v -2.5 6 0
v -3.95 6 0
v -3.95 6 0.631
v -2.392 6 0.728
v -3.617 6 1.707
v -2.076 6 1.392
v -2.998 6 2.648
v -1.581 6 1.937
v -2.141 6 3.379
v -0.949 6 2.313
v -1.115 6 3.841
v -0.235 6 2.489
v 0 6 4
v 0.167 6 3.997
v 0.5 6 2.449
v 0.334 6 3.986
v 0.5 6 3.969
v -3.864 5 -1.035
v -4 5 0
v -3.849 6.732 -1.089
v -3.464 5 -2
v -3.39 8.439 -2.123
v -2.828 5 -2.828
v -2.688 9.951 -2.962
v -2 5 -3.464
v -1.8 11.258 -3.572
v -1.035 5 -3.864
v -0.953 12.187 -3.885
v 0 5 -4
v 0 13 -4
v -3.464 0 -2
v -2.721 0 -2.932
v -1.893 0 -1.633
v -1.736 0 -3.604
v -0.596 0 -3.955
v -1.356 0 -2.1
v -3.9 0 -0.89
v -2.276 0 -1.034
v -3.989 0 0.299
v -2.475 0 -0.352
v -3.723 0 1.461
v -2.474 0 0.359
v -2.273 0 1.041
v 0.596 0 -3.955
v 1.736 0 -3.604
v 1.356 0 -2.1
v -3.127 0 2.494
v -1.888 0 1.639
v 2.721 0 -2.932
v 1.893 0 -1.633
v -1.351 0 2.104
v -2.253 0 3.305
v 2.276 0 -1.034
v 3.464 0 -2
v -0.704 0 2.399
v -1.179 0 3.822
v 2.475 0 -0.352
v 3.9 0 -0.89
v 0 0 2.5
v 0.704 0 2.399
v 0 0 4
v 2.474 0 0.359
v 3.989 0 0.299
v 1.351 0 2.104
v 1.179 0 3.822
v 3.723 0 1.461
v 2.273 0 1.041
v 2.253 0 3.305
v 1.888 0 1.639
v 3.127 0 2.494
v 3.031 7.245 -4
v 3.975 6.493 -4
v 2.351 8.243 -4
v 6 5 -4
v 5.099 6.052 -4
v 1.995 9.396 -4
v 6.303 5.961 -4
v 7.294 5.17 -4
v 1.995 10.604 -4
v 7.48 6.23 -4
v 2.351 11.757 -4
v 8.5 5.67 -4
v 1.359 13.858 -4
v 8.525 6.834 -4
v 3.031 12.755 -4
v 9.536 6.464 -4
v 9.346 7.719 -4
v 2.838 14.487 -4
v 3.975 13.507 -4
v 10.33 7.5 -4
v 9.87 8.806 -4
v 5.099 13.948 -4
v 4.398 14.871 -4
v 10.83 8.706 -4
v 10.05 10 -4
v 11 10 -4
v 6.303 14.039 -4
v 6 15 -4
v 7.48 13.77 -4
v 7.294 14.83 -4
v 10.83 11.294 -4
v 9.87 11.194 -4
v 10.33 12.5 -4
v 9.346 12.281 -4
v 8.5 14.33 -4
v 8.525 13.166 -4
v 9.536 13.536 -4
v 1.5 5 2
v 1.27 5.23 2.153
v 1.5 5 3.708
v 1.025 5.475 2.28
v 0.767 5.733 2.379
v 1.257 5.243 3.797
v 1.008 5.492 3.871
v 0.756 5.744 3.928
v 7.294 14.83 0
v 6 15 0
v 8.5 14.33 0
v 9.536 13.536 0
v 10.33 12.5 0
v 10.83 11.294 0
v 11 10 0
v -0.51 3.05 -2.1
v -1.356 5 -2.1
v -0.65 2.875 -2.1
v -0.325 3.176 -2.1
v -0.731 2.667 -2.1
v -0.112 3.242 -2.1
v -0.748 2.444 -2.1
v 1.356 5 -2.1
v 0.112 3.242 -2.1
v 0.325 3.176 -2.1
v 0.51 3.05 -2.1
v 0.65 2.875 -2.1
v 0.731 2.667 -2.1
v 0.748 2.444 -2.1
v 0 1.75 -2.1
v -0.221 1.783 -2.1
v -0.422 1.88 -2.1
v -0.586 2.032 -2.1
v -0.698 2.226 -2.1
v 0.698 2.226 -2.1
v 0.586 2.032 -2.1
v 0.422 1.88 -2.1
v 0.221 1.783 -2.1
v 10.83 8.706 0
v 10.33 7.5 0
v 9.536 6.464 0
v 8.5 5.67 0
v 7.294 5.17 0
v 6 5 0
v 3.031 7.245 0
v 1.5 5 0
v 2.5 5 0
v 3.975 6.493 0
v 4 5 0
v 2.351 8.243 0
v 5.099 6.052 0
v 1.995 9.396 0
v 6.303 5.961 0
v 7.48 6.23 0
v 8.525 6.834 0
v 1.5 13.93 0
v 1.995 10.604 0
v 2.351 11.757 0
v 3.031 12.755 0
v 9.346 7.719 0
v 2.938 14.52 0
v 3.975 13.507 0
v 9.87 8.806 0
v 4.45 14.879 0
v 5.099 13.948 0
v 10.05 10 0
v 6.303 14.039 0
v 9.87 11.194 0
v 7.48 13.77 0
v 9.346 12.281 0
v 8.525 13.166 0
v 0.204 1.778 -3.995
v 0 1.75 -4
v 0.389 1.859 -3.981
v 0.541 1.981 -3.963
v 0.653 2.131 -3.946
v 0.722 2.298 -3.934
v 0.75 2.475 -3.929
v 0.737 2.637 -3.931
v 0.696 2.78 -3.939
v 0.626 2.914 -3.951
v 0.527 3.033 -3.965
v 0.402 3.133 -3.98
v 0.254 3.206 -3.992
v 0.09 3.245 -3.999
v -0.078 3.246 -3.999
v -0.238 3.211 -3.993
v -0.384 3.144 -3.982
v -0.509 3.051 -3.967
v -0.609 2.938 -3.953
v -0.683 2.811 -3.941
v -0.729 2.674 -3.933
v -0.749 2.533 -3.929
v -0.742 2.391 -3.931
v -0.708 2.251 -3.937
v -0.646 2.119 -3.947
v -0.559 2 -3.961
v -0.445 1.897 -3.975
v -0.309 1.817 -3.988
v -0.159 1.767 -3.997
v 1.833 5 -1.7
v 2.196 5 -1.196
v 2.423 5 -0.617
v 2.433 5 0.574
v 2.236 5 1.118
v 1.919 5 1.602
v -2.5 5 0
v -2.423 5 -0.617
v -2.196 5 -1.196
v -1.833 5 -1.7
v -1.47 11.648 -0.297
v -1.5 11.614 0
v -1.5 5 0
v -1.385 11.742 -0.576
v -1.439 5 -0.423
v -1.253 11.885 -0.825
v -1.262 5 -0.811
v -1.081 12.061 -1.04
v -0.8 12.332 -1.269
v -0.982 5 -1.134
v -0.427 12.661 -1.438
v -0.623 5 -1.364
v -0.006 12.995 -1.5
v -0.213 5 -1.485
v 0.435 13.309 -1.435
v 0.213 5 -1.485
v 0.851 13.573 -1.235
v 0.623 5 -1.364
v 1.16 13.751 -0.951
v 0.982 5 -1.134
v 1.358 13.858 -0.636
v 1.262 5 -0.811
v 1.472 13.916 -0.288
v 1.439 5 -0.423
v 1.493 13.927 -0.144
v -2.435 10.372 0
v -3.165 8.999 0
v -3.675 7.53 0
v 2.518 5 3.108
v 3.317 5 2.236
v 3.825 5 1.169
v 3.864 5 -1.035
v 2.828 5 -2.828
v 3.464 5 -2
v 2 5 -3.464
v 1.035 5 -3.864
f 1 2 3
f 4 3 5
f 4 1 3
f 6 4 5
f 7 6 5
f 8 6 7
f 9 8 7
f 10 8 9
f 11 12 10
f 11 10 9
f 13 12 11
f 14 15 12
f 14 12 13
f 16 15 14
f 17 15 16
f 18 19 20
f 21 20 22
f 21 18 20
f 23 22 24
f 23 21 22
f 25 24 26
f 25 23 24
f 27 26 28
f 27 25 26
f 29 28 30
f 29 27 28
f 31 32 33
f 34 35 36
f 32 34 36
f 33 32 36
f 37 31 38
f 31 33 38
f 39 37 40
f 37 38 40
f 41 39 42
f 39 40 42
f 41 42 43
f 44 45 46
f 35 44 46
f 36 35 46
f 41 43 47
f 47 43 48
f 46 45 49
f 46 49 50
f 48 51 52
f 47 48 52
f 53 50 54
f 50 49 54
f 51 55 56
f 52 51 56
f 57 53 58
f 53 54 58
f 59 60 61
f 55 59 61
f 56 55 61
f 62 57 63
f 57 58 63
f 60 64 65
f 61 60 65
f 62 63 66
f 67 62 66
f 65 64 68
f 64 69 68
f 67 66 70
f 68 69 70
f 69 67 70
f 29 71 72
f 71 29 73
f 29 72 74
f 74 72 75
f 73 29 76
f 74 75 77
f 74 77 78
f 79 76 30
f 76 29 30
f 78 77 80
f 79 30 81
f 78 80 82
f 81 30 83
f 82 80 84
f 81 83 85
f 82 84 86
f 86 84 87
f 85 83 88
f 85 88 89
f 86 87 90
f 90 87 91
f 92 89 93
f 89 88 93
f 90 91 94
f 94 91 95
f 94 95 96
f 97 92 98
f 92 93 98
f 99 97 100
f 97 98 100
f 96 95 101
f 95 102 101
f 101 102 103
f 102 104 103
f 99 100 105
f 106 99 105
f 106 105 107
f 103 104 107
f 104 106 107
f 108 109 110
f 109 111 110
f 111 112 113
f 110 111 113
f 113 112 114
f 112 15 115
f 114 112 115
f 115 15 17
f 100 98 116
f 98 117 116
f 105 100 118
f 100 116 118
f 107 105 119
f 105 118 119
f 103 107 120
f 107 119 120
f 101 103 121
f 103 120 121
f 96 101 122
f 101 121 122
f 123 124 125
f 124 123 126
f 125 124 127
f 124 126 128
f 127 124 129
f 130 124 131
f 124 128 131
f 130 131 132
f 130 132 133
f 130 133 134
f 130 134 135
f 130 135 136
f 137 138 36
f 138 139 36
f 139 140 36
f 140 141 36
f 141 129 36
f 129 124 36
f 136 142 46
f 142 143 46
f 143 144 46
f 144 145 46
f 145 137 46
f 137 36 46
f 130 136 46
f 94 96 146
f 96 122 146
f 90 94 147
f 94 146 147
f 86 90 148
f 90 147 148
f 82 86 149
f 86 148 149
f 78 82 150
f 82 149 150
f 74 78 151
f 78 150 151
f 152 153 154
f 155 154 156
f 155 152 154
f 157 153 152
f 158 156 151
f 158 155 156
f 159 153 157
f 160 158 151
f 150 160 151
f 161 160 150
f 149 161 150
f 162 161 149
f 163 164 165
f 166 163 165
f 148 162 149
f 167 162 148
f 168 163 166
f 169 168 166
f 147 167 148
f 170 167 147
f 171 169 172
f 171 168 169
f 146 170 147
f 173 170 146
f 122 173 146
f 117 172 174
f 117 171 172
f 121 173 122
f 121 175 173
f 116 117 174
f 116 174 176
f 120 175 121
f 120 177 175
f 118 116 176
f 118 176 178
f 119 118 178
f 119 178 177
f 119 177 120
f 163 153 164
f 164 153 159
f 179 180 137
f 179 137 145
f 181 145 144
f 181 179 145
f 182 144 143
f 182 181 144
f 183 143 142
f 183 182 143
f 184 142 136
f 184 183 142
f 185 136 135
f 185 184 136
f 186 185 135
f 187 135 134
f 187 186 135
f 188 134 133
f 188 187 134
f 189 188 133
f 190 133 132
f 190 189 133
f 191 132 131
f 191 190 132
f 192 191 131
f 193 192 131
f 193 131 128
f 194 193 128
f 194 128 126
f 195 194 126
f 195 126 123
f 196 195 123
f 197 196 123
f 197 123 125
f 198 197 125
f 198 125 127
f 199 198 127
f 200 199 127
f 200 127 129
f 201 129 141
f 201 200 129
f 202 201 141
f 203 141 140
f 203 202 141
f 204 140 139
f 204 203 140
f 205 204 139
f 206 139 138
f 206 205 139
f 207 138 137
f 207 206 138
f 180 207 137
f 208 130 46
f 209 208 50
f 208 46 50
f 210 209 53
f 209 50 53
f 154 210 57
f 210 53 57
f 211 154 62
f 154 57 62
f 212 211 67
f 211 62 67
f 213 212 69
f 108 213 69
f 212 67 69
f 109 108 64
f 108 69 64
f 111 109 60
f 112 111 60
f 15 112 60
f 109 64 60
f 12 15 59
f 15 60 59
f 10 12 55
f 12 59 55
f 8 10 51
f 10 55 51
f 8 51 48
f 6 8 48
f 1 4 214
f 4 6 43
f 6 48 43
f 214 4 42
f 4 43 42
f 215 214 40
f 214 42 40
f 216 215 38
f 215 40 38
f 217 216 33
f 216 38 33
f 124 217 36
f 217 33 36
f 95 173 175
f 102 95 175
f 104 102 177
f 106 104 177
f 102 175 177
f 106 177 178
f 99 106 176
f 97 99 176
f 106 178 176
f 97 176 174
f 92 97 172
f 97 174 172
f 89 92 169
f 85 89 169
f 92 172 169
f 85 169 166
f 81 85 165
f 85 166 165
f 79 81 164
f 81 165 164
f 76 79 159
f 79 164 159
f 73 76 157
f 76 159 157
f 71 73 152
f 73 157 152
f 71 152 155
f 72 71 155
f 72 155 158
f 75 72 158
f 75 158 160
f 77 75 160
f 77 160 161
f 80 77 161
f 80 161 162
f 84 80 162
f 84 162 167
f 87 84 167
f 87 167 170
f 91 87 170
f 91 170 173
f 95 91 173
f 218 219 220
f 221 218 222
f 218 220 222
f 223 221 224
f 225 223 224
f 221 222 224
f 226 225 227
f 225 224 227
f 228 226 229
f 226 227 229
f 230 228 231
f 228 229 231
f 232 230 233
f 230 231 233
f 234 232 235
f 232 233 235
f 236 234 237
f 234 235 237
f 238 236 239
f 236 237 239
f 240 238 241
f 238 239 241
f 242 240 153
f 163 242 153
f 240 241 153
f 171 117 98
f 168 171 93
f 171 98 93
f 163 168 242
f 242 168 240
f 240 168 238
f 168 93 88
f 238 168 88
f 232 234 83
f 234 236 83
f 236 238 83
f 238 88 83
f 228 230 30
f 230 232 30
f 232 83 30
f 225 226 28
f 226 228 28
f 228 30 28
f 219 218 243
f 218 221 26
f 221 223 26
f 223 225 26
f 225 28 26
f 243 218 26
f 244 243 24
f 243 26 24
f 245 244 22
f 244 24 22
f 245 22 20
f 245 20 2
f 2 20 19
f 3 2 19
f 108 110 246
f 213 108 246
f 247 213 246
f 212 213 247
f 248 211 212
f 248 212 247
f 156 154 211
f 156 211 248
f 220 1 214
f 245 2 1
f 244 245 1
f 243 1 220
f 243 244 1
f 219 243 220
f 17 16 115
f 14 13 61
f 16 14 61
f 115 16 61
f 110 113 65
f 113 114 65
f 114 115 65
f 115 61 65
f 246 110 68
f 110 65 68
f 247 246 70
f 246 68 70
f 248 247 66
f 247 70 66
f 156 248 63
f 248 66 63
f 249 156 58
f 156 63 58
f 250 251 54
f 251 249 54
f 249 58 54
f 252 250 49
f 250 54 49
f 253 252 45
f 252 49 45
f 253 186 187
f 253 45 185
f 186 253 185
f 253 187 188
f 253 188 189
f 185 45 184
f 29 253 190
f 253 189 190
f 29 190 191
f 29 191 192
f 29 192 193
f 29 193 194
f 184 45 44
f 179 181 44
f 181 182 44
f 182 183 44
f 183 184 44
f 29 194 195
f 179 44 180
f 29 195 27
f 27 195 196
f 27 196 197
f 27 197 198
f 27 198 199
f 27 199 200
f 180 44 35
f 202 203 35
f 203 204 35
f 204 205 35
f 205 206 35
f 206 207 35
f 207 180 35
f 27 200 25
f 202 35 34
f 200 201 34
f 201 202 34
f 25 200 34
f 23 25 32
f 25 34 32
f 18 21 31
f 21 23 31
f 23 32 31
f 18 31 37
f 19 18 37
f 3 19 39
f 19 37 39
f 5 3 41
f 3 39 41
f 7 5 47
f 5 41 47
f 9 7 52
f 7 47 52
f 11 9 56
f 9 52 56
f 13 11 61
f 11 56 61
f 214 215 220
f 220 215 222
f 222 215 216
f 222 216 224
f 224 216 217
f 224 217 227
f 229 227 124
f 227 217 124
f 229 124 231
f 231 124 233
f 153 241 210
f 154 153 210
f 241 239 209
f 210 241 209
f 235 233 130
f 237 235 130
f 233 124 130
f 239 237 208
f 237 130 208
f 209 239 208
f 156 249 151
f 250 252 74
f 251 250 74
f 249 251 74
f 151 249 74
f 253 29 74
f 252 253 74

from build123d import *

# Parameters (mm, degrees)
SKETCH_1_R          = 4
EXTRUDE_1_DEPTH     = 6
CUT_EXTRUDE_1_DEPTH = 9.246211251
SKETCH_4_W          = 15
SKETCH_4_H          = 10
EXTRUDE_2_DEPTH     = 4
SKETCH_5_R          = 4.05
CUT_EXTRUDE_3_DEPTH = 20.02629759
FILLET_1_R          = 10
FILLET_2_R          = 5
CUT_EXTRUDE_4_DEPTH = 16.394804409
SKETCH_7_R          = 1.5
CUT_EXTRUDE_5_DEPTH = 20.02629769
SKETCH_8_R          = 0.75
CUT_EXTRUDE_7_DEPTH = 3
SKETCH_9_W          = 2.5
SKETCH_9_H          = 1
CUT_EXTRUDE_8_DEPTH = 20.02629769
CHAMFER_1_SIZE      = 1


# Some blends are built 0.0001 mm under size
with BuildPart() as part:
    # 草图1 → 凸台-拉伸1 (new body)
    with BuildSketch(Plane(origin=(0, 0, 0), x_dir=(1, 0, 0), z_dir=(0, 1, 0))):
        with Locations(Location((0, 0, 0), (0, 0, 270))):
            Circle(SKETCH_1_R)
    extrude(amount=EXTRUDE_1_DEPTH)

    # 草图2 → 切除-拉伸1 (cut, through all)
    with BuildSketch(Plane(origin=(0, 0, 0), x_dir=(1, 0, 0), z_dir=(0, 1, 0))):
        with BuildLine():
            Line((-1.356465997, 2.1), (1.356465997, 2.1))
            ThreePointArc((1.356465997, 2.1), (0, -2.5), (-1.356465997, 2.1))
        make_face()
    extrude(amount=CUT_EXTRUDE_1_DEPTH, mode=Mode.SUBTRACT)

    # 草图4 → 凸台-拉伸2 (add)
    with BuildSketch(Plane.XY.offset(-4)):
        with Locations((3.5, 10)):
            Rectangle(SKETCH_4_W, SKETCH_4_H)
    extrude(amount=EXTRUDE_2_DEPTH)

    # 草图5 → 切除-拉伸3 (cut, through all)
    with BuildSketch(Plane.XY):
        with Locations((6, 10)):
            Circle(SKETCH_5_R)
    extrude(amount=-CUT_EXTRUDE_3_DEPTH, mode=Mode.SUBTRACT)

    # 圆角1
    # the kernel refuses this fillet: 10 mm, written as the material it takes off along each edge
    with BuildSketch(Plane(origin=(-4, 15, -29), x_dir=(0, -1, 0), z_dir=(0, 0, 1))) as fillet_1_piece_1:
        with BuildLine():
            CenterArc((FILLET_1_R, FILLET_1_R), FILLET_1_R, 180, 90)
            Line((0, FILLET_1_R), (0, 0))
            Line((0, 0), (FILLET_1_R, 0))
        make_face()
    extrude(amount=54, mode=Mode.SUBTRACT)

    # 圆角2
    fillet_2_edges = [part.edges().sort_by_distance(p)[0] for p in [
        (11, 5, -2),
        (11, 15, -2),
    ]]
    fillet(fillet_2_edges, radius=FILLET_2_R - 0.0001)  # a hair under: the kernel refuses the full size

    # 草图6 → 切除-拉伸4 (cut, through all)
    with BuildSketch(Plane.XZ.offset(-5)):
        with BuildLine():
            Line((-4, -4), (-4, 0))
            ThreePointArc((-4, 0), (-2.828427125, -2.828427125), (0, -4))
            Line((0, -4), (-4, -4))
        make_face()
    extrude(amount=-CUT_EXTRUDE_4_DEPTH, mode=Mode.SUBTRACT)

    # 草图7 → 切除-拉伸5 (cut, through all)
    with BuildSketch(Plane.XZ):
        Circle(SKETCH_7_R)
    extrude(amount=-CUT_EXTRUDE_5_DEPTH, mode=Mode.SUBTRACT)

    # 草图8 → 切除-拉伸7 (cut)
    with BuildSketch(Plane.XY.offset(-4)):
        with Locations(Location((0, 2.5, 0), (0, 0, 270))):
            Circle(SKETCH_8_R)
    extrude(amount=CUT_EXTRUDE_7_DEPTH, mode=Mode.SUBTRACT)

    # 草图9 → 切除-拉伸8 (cut, through all)
    with BuildSketch(Plane.XY):
        with Locations((2.75, 5.5)):
            Rectangle(SKETCH_9_W, SKETCH_9_H)
    extrude(amount=CUT_EXTRUDE_8_DEPTH, mode=Mode.SUBTRACT)

    # 倒角1
    chamfer_1_edges = [part.edges().sort_by_distance(p)[0] for p in [
        (1.5, 6, 2.854049622),
    ]]
    chamfer(chamfer_1_edges, length=CHAMFER_1_SIZE - 0.0001)  # a hair under: the kernel refuses the full size


solid = part.part
